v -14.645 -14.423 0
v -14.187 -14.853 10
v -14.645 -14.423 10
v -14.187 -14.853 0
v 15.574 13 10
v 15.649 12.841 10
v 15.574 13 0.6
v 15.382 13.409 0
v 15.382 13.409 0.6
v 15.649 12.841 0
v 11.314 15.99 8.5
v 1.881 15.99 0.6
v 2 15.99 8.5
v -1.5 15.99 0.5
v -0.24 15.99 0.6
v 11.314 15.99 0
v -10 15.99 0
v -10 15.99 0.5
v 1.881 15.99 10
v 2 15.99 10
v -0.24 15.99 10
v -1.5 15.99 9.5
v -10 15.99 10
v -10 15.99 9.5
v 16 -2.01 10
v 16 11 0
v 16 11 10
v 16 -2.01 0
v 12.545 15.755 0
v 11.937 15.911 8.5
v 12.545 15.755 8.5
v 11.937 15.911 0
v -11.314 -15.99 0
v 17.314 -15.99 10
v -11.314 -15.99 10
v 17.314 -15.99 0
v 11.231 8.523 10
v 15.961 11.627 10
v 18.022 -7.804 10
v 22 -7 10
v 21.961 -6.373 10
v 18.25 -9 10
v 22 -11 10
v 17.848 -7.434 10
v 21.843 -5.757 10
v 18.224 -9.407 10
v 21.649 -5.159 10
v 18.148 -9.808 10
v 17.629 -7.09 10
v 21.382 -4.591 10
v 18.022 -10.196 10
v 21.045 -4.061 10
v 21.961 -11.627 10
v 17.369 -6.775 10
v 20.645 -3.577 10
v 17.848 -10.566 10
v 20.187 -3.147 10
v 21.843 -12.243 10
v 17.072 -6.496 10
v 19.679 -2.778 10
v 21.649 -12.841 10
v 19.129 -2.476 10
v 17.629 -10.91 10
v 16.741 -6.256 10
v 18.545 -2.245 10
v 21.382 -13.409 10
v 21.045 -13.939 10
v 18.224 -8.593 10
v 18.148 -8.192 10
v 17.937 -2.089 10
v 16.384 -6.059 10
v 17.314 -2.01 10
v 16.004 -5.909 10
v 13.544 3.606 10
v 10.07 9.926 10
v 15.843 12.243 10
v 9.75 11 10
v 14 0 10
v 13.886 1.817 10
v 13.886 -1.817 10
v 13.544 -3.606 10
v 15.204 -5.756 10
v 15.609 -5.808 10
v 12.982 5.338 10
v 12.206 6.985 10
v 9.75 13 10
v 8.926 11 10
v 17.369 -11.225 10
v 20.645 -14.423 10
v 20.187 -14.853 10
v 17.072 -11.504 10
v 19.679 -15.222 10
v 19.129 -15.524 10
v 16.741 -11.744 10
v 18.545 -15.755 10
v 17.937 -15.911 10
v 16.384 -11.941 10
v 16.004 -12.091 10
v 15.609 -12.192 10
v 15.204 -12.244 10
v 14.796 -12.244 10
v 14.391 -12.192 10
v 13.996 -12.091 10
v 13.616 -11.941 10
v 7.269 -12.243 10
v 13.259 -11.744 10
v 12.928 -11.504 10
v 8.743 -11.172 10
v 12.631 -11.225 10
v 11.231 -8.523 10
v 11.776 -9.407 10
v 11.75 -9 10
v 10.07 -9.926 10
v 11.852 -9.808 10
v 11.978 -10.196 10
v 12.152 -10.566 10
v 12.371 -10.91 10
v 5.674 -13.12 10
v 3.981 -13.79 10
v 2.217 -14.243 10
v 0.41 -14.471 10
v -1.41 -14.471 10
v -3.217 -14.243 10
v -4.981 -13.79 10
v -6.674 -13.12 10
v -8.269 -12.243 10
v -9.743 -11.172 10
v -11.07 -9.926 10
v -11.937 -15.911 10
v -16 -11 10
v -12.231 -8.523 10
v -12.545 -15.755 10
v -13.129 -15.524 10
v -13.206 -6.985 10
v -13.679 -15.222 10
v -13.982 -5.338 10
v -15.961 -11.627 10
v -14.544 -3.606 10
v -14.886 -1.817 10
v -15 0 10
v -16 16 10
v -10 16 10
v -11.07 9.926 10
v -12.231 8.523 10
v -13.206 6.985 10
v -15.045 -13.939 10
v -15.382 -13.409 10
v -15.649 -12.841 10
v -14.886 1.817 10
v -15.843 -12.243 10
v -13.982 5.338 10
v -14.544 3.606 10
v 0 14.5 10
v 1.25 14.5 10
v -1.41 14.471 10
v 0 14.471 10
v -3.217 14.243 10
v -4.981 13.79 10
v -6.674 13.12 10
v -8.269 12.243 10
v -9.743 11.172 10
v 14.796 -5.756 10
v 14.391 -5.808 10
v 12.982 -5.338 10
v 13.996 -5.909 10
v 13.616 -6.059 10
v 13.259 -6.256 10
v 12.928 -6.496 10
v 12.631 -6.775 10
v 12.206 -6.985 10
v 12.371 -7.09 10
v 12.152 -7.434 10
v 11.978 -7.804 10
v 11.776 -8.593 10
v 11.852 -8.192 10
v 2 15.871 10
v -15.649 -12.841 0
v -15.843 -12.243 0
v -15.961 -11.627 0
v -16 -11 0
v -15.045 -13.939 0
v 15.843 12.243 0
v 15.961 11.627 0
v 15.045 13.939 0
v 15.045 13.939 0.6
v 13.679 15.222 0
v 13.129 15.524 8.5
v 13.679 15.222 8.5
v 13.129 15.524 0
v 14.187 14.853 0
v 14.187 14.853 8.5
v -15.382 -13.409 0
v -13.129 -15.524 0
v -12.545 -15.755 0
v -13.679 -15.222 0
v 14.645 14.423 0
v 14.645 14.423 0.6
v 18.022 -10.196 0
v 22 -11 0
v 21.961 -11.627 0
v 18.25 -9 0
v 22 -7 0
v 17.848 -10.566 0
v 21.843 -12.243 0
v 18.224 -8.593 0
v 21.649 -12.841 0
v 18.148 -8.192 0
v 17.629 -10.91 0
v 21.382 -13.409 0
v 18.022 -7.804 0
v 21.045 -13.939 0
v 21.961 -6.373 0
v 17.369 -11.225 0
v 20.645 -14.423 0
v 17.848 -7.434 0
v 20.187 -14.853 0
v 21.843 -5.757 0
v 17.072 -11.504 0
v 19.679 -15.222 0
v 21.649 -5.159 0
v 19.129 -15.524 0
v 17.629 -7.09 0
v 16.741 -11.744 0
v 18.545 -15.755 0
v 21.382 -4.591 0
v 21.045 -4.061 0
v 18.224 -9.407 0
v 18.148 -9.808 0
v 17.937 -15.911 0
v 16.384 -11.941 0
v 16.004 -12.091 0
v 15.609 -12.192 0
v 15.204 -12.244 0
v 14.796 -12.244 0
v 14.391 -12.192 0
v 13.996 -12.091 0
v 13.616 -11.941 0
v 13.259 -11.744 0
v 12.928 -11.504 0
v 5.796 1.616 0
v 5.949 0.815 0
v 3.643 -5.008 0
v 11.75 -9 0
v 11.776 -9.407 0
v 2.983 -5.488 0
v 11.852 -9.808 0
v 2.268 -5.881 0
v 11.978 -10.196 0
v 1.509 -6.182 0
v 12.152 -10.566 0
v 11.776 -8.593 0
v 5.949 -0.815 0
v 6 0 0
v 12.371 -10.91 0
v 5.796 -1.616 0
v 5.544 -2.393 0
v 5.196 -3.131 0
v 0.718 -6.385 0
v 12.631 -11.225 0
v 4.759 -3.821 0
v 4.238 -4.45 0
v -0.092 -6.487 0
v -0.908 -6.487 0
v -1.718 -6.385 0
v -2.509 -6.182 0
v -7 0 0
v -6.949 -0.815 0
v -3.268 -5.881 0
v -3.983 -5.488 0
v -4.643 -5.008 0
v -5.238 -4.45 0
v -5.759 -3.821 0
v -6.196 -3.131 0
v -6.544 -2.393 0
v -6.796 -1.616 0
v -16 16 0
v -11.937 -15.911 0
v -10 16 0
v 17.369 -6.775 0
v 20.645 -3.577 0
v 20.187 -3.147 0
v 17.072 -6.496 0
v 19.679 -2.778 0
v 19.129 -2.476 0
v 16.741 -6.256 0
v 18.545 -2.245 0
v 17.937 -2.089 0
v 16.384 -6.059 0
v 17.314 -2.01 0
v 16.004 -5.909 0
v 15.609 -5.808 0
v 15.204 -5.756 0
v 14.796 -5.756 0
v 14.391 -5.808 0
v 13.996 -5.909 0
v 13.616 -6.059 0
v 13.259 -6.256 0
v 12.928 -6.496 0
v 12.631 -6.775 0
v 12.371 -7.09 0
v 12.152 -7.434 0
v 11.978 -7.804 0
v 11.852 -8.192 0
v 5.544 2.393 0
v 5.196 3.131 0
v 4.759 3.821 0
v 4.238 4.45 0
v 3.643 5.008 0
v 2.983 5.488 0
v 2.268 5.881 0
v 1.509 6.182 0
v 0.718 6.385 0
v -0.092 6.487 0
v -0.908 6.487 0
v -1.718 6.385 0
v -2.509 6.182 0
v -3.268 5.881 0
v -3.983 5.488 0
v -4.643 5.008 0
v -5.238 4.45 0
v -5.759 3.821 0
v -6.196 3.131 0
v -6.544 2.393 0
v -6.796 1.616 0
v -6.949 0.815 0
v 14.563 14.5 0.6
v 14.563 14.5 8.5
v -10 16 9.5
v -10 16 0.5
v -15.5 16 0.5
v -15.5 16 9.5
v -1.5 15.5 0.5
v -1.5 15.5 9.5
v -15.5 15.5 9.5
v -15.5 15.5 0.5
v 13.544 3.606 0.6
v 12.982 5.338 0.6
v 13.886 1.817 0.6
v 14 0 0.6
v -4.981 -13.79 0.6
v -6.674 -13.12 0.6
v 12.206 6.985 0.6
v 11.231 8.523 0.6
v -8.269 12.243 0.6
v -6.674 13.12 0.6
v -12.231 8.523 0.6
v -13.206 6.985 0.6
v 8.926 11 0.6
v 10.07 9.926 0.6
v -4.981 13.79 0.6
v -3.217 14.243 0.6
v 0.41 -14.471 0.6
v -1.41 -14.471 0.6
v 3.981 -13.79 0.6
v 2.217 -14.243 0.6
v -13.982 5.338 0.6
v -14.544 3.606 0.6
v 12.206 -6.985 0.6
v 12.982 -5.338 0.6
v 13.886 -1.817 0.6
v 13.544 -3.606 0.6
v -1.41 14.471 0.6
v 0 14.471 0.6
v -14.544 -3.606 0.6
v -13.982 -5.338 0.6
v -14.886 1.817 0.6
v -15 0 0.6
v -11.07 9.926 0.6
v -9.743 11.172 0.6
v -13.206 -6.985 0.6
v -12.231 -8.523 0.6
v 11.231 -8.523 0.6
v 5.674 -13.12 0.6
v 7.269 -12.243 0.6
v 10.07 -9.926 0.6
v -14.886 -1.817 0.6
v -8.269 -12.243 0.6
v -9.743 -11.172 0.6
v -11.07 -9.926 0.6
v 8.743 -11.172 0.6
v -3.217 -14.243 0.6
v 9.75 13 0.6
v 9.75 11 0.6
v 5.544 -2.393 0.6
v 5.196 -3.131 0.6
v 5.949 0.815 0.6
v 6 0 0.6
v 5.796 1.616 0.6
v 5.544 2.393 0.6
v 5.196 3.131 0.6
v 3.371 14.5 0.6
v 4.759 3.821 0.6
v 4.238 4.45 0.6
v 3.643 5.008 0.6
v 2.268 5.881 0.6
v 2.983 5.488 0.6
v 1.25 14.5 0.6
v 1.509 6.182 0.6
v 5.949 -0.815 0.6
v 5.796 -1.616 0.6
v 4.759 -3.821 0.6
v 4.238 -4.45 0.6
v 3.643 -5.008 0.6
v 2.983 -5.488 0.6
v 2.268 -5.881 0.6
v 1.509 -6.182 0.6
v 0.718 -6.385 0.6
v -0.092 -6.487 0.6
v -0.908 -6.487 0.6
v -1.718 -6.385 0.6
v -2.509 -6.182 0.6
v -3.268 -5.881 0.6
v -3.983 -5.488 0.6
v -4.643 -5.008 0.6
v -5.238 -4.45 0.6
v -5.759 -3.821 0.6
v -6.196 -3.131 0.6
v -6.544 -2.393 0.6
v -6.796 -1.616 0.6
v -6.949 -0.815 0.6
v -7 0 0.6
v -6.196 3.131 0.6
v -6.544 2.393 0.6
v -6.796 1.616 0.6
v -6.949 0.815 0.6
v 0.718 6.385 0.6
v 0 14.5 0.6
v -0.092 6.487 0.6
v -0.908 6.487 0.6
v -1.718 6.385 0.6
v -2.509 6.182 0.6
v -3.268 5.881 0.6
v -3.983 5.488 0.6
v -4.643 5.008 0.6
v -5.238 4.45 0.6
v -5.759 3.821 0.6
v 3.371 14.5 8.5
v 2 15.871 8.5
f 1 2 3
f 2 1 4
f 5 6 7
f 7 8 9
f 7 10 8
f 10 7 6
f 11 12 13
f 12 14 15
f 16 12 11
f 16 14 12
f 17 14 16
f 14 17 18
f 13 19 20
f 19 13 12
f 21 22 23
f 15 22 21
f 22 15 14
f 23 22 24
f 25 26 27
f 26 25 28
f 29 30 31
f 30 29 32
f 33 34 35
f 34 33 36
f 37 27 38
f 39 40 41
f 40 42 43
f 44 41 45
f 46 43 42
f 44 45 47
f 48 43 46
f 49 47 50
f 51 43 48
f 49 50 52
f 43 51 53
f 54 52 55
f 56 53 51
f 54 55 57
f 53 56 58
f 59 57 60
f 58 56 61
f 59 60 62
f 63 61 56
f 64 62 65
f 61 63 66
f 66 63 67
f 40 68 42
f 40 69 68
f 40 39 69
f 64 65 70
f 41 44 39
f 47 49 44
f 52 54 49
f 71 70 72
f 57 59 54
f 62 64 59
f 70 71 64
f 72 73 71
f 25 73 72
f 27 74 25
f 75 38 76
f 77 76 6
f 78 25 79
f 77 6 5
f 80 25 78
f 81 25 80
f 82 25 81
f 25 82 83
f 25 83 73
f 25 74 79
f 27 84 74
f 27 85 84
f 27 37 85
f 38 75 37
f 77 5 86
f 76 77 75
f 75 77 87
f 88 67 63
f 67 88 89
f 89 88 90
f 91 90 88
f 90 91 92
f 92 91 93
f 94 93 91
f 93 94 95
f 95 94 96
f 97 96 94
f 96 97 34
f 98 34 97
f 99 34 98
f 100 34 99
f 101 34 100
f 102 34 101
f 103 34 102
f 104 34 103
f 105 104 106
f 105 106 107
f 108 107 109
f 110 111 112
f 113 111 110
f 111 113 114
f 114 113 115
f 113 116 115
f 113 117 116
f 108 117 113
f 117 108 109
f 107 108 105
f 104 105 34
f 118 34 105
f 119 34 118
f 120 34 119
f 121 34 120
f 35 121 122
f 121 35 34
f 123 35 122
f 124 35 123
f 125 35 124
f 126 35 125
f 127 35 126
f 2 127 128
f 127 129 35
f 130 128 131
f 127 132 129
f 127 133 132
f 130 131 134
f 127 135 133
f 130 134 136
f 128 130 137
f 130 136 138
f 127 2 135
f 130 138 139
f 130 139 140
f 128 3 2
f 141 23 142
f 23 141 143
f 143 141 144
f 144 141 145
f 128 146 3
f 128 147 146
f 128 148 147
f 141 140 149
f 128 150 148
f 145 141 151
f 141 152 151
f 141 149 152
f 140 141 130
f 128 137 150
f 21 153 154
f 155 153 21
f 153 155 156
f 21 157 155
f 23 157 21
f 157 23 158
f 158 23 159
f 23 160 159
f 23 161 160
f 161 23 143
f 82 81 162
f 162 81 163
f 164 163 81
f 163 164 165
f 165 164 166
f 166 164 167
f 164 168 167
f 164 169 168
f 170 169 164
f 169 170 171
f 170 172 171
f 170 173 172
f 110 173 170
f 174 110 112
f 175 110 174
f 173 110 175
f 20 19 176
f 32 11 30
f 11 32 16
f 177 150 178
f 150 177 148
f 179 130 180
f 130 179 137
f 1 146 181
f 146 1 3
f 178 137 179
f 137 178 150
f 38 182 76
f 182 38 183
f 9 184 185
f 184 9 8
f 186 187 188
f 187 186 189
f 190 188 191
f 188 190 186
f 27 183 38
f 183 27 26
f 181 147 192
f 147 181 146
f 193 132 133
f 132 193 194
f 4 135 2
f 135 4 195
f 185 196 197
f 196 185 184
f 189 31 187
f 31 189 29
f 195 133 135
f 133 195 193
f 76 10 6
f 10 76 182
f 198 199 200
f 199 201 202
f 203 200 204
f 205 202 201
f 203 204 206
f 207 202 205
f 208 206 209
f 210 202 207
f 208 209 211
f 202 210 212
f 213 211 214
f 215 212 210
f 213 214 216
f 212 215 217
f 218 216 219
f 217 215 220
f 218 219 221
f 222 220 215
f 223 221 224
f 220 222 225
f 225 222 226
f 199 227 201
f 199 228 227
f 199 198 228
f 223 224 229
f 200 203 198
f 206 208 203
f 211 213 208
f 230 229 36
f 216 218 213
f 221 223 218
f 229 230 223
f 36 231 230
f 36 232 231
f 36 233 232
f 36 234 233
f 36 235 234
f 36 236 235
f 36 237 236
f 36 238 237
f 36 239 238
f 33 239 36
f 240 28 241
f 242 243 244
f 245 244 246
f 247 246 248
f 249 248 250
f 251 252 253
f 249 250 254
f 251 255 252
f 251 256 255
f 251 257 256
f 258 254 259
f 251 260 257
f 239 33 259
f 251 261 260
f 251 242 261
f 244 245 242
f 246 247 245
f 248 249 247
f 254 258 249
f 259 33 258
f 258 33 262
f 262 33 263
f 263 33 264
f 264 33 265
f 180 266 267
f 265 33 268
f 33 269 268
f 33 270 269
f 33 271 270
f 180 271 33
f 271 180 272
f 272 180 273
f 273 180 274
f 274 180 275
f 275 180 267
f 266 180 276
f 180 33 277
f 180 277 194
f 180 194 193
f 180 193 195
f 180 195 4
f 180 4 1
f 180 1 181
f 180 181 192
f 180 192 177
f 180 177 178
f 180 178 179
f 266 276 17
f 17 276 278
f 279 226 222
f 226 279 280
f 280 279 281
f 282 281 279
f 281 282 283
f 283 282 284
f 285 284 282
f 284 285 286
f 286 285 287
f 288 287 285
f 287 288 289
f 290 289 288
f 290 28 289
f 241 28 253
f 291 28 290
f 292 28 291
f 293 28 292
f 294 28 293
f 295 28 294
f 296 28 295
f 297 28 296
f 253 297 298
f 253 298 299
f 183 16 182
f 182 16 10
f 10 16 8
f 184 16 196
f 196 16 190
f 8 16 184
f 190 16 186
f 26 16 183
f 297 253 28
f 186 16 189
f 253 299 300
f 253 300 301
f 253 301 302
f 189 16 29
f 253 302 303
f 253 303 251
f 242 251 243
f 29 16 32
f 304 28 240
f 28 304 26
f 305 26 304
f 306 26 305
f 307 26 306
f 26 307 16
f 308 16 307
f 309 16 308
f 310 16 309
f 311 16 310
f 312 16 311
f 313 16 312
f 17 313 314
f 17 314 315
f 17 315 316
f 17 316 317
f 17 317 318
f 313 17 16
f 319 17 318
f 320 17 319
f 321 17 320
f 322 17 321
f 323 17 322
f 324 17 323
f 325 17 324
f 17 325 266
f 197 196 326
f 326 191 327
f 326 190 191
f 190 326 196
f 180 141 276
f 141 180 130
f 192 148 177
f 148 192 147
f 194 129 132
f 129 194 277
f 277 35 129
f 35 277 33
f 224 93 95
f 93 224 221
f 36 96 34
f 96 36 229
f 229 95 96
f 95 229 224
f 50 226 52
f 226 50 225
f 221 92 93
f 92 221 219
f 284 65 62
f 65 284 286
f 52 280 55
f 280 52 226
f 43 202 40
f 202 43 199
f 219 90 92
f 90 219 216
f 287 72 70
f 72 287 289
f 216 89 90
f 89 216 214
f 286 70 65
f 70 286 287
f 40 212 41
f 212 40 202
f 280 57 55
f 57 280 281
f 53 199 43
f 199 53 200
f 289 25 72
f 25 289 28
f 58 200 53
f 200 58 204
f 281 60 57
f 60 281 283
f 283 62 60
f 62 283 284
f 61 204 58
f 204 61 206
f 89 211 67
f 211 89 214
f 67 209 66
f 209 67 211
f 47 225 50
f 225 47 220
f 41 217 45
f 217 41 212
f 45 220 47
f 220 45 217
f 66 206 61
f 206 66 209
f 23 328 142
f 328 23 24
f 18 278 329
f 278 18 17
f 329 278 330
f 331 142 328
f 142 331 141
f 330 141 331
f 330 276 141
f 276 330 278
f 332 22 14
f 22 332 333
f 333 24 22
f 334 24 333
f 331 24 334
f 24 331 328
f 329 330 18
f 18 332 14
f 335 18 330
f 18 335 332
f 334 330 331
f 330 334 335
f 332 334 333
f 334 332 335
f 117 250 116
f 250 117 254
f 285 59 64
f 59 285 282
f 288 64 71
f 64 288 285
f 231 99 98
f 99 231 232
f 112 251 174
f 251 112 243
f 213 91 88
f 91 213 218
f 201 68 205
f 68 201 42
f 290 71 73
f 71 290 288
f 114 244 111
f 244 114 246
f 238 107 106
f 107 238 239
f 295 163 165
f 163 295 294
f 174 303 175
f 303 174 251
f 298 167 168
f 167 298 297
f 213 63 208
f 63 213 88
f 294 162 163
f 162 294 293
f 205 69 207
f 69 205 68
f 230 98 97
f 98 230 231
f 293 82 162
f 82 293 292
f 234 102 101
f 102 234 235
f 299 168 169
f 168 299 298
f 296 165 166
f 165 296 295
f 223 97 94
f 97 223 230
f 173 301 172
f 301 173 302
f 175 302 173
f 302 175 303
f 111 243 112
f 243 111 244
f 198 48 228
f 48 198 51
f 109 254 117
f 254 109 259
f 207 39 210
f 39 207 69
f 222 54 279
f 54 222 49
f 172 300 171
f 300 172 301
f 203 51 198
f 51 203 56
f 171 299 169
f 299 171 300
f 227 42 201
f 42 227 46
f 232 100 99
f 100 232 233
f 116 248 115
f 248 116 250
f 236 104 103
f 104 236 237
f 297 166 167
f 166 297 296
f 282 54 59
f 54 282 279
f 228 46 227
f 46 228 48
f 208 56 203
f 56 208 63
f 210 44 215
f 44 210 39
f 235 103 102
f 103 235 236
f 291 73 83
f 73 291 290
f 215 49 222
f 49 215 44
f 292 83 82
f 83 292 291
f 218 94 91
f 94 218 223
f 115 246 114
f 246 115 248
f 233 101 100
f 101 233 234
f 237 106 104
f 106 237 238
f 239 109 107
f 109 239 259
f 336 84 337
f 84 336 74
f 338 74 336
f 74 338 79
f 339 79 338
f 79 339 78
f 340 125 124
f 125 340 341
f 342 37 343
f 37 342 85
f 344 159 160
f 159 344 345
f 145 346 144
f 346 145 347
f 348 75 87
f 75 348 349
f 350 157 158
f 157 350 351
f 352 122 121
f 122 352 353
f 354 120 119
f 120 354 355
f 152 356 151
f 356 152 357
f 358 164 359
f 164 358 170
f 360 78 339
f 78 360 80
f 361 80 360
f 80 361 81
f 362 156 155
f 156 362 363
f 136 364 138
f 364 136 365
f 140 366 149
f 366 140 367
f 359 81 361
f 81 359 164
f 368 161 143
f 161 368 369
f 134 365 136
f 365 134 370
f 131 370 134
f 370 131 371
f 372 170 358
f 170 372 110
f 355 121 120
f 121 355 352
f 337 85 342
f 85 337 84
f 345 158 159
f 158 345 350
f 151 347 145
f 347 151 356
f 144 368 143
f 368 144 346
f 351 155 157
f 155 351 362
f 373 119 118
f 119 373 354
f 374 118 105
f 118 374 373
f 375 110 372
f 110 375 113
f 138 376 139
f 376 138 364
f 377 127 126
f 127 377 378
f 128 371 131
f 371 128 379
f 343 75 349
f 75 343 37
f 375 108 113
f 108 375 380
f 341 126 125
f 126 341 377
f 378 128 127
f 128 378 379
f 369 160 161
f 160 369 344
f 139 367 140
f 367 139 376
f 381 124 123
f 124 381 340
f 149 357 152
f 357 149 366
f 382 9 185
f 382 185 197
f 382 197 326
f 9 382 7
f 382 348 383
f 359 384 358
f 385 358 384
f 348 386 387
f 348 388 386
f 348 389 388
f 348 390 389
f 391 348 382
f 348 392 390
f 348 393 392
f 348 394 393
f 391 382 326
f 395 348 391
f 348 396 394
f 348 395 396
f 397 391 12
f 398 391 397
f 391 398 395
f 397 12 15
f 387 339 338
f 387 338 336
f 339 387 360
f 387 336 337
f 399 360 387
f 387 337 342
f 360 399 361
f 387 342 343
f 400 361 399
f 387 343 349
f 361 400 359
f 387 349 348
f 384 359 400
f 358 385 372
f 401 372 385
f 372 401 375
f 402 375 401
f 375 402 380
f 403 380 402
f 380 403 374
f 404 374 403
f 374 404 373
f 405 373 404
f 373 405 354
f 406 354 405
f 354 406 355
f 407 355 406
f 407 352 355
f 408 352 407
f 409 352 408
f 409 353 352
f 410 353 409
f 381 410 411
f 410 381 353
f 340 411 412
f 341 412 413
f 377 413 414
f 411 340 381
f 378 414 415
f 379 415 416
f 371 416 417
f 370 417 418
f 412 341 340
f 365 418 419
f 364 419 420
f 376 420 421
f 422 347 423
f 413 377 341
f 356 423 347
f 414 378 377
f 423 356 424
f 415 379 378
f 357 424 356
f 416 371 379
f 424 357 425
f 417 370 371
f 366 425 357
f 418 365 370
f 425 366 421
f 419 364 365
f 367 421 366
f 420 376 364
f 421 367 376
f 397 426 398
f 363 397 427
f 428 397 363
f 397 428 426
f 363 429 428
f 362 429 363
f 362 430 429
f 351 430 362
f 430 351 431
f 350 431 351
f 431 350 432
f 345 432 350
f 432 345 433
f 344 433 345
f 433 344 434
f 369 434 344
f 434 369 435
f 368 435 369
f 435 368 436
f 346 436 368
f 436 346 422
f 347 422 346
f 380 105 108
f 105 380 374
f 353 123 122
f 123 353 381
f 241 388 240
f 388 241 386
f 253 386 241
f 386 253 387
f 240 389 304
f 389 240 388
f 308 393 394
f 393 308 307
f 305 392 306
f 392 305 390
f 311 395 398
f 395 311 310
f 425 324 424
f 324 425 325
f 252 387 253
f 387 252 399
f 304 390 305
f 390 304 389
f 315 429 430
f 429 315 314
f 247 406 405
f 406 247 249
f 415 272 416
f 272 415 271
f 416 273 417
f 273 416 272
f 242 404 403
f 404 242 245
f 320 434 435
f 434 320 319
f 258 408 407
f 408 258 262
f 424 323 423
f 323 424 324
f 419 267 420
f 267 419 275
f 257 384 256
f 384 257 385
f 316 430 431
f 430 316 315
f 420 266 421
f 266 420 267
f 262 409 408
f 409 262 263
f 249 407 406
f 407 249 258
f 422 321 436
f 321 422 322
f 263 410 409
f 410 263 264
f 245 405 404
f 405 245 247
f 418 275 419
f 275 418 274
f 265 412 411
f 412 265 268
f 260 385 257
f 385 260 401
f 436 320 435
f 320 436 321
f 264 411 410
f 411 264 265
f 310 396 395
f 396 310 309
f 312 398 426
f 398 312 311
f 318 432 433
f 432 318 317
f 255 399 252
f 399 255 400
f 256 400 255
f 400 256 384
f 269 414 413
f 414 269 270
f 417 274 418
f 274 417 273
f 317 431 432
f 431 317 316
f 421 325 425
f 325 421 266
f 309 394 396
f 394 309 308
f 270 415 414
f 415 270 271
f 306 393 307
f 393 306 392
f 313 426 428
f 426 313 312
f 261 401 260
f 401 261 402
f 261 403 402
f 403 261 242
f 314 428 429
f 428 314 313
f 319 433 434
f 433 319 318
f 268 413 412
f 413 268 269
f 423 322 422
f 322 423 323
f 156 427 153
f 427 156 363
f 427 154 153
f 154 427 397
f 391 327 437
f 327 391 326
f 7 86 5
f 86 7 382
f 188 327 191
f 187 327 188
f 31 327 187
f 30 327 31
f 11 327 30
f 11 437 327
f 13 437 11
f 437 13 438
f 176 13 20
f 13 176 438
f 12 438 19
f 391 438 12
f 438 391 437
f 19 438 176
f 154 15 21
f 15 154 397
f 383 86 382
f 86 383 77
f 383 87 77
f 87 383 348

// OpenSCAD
$fn = 50;


difference() {
	union() {
		hull() {
			translate(v = [-11.0000000000, 11.0000000000, 0]) {
				cylinder(h = 10, r = 5);
			}
			translate(v = [11.0000000000, 11.0000000000, 0]) {
				cylinder(h = 10, r = 5);
			}
			translate(v = [-11.0000000000, -11.0000000000, 0]) {
				cylinder(h = 10, r = 5);
			}
			translate(v = [11.0000000000, -11.0000000000, 0]) {
				cylinder(h = 10, r = 5);
			}
		}
		translate(v = [7.5000000000, -9.0000000000, 0]) {
			hull() {
				translate(v = [-9.5000000000, 2.0000000000, 0]) {
					cylinder(h = 10, r = 5);
				}
				translate(v = [9.5000000000, 2.0000000000, 0]) {
					cylinder(h = 10, r = 5);
				}
				translate(v = [-9.5000000000, -2.0000000000, 0]) {
					cylinder(h = 10, r = 5);
				}
				translate(v = [9.5000000000, -2.0000000000, 0]) {
					cylinder(h = 10, r = 5);
				}
			}
		}
		translate(v = [-16.0000000000, 10.0000000000, 0]) {
			cube(size = [6, 6, 10]);
		}
	}
	union() {
		translate(v = [-15.5000000000, 15.5000000000, 0.5000000000]) {
			cube(size = [14, 0.5000000000, 9.0000000000]);
		}
		translate(v = [15.0000000000, -9.0000000000, -50.0000000000]) {
			cylinder(h = 100, r = 3.2500000000);
		}
		translate(v = [-0.5000000000, 0.0000000000, 0.6000000000]) {
			cylinder(h = 12.4000000000, r = 14.5000000000);
		}
		translate(v = [-0.5000000000, 0.0000000000, -5.0000000000]) {
			cylinder(h = 10, r = 6.5000000000);
		}
		translate(v = [0.0000000000, 13.0000000000, 0.6000000000]) {
			cube(size = [16.0000000000, 1.5000000000, 12.4000000000]);
		}
		translate(v = [2.0000000000, 13.0000000000, 8.5000000000]) {
			cube(size = [14.0000000000, 4.5000000000, 1.5000000000]);
		}
		translate(v = [-3.0000000000, 18.7500000000, 0.6000000000]) {
			rotate(a = [0, 0, -45]) {
				cube(size = [10, 1.5000000000, 12.4000000000]);
			}
		}
		translate(v = [2.2500000000, 11.0000000000, 0.6000000000]) {
			cube(size = [7.5000000000, 2, 9.4000000000]);
		}
	}
}
